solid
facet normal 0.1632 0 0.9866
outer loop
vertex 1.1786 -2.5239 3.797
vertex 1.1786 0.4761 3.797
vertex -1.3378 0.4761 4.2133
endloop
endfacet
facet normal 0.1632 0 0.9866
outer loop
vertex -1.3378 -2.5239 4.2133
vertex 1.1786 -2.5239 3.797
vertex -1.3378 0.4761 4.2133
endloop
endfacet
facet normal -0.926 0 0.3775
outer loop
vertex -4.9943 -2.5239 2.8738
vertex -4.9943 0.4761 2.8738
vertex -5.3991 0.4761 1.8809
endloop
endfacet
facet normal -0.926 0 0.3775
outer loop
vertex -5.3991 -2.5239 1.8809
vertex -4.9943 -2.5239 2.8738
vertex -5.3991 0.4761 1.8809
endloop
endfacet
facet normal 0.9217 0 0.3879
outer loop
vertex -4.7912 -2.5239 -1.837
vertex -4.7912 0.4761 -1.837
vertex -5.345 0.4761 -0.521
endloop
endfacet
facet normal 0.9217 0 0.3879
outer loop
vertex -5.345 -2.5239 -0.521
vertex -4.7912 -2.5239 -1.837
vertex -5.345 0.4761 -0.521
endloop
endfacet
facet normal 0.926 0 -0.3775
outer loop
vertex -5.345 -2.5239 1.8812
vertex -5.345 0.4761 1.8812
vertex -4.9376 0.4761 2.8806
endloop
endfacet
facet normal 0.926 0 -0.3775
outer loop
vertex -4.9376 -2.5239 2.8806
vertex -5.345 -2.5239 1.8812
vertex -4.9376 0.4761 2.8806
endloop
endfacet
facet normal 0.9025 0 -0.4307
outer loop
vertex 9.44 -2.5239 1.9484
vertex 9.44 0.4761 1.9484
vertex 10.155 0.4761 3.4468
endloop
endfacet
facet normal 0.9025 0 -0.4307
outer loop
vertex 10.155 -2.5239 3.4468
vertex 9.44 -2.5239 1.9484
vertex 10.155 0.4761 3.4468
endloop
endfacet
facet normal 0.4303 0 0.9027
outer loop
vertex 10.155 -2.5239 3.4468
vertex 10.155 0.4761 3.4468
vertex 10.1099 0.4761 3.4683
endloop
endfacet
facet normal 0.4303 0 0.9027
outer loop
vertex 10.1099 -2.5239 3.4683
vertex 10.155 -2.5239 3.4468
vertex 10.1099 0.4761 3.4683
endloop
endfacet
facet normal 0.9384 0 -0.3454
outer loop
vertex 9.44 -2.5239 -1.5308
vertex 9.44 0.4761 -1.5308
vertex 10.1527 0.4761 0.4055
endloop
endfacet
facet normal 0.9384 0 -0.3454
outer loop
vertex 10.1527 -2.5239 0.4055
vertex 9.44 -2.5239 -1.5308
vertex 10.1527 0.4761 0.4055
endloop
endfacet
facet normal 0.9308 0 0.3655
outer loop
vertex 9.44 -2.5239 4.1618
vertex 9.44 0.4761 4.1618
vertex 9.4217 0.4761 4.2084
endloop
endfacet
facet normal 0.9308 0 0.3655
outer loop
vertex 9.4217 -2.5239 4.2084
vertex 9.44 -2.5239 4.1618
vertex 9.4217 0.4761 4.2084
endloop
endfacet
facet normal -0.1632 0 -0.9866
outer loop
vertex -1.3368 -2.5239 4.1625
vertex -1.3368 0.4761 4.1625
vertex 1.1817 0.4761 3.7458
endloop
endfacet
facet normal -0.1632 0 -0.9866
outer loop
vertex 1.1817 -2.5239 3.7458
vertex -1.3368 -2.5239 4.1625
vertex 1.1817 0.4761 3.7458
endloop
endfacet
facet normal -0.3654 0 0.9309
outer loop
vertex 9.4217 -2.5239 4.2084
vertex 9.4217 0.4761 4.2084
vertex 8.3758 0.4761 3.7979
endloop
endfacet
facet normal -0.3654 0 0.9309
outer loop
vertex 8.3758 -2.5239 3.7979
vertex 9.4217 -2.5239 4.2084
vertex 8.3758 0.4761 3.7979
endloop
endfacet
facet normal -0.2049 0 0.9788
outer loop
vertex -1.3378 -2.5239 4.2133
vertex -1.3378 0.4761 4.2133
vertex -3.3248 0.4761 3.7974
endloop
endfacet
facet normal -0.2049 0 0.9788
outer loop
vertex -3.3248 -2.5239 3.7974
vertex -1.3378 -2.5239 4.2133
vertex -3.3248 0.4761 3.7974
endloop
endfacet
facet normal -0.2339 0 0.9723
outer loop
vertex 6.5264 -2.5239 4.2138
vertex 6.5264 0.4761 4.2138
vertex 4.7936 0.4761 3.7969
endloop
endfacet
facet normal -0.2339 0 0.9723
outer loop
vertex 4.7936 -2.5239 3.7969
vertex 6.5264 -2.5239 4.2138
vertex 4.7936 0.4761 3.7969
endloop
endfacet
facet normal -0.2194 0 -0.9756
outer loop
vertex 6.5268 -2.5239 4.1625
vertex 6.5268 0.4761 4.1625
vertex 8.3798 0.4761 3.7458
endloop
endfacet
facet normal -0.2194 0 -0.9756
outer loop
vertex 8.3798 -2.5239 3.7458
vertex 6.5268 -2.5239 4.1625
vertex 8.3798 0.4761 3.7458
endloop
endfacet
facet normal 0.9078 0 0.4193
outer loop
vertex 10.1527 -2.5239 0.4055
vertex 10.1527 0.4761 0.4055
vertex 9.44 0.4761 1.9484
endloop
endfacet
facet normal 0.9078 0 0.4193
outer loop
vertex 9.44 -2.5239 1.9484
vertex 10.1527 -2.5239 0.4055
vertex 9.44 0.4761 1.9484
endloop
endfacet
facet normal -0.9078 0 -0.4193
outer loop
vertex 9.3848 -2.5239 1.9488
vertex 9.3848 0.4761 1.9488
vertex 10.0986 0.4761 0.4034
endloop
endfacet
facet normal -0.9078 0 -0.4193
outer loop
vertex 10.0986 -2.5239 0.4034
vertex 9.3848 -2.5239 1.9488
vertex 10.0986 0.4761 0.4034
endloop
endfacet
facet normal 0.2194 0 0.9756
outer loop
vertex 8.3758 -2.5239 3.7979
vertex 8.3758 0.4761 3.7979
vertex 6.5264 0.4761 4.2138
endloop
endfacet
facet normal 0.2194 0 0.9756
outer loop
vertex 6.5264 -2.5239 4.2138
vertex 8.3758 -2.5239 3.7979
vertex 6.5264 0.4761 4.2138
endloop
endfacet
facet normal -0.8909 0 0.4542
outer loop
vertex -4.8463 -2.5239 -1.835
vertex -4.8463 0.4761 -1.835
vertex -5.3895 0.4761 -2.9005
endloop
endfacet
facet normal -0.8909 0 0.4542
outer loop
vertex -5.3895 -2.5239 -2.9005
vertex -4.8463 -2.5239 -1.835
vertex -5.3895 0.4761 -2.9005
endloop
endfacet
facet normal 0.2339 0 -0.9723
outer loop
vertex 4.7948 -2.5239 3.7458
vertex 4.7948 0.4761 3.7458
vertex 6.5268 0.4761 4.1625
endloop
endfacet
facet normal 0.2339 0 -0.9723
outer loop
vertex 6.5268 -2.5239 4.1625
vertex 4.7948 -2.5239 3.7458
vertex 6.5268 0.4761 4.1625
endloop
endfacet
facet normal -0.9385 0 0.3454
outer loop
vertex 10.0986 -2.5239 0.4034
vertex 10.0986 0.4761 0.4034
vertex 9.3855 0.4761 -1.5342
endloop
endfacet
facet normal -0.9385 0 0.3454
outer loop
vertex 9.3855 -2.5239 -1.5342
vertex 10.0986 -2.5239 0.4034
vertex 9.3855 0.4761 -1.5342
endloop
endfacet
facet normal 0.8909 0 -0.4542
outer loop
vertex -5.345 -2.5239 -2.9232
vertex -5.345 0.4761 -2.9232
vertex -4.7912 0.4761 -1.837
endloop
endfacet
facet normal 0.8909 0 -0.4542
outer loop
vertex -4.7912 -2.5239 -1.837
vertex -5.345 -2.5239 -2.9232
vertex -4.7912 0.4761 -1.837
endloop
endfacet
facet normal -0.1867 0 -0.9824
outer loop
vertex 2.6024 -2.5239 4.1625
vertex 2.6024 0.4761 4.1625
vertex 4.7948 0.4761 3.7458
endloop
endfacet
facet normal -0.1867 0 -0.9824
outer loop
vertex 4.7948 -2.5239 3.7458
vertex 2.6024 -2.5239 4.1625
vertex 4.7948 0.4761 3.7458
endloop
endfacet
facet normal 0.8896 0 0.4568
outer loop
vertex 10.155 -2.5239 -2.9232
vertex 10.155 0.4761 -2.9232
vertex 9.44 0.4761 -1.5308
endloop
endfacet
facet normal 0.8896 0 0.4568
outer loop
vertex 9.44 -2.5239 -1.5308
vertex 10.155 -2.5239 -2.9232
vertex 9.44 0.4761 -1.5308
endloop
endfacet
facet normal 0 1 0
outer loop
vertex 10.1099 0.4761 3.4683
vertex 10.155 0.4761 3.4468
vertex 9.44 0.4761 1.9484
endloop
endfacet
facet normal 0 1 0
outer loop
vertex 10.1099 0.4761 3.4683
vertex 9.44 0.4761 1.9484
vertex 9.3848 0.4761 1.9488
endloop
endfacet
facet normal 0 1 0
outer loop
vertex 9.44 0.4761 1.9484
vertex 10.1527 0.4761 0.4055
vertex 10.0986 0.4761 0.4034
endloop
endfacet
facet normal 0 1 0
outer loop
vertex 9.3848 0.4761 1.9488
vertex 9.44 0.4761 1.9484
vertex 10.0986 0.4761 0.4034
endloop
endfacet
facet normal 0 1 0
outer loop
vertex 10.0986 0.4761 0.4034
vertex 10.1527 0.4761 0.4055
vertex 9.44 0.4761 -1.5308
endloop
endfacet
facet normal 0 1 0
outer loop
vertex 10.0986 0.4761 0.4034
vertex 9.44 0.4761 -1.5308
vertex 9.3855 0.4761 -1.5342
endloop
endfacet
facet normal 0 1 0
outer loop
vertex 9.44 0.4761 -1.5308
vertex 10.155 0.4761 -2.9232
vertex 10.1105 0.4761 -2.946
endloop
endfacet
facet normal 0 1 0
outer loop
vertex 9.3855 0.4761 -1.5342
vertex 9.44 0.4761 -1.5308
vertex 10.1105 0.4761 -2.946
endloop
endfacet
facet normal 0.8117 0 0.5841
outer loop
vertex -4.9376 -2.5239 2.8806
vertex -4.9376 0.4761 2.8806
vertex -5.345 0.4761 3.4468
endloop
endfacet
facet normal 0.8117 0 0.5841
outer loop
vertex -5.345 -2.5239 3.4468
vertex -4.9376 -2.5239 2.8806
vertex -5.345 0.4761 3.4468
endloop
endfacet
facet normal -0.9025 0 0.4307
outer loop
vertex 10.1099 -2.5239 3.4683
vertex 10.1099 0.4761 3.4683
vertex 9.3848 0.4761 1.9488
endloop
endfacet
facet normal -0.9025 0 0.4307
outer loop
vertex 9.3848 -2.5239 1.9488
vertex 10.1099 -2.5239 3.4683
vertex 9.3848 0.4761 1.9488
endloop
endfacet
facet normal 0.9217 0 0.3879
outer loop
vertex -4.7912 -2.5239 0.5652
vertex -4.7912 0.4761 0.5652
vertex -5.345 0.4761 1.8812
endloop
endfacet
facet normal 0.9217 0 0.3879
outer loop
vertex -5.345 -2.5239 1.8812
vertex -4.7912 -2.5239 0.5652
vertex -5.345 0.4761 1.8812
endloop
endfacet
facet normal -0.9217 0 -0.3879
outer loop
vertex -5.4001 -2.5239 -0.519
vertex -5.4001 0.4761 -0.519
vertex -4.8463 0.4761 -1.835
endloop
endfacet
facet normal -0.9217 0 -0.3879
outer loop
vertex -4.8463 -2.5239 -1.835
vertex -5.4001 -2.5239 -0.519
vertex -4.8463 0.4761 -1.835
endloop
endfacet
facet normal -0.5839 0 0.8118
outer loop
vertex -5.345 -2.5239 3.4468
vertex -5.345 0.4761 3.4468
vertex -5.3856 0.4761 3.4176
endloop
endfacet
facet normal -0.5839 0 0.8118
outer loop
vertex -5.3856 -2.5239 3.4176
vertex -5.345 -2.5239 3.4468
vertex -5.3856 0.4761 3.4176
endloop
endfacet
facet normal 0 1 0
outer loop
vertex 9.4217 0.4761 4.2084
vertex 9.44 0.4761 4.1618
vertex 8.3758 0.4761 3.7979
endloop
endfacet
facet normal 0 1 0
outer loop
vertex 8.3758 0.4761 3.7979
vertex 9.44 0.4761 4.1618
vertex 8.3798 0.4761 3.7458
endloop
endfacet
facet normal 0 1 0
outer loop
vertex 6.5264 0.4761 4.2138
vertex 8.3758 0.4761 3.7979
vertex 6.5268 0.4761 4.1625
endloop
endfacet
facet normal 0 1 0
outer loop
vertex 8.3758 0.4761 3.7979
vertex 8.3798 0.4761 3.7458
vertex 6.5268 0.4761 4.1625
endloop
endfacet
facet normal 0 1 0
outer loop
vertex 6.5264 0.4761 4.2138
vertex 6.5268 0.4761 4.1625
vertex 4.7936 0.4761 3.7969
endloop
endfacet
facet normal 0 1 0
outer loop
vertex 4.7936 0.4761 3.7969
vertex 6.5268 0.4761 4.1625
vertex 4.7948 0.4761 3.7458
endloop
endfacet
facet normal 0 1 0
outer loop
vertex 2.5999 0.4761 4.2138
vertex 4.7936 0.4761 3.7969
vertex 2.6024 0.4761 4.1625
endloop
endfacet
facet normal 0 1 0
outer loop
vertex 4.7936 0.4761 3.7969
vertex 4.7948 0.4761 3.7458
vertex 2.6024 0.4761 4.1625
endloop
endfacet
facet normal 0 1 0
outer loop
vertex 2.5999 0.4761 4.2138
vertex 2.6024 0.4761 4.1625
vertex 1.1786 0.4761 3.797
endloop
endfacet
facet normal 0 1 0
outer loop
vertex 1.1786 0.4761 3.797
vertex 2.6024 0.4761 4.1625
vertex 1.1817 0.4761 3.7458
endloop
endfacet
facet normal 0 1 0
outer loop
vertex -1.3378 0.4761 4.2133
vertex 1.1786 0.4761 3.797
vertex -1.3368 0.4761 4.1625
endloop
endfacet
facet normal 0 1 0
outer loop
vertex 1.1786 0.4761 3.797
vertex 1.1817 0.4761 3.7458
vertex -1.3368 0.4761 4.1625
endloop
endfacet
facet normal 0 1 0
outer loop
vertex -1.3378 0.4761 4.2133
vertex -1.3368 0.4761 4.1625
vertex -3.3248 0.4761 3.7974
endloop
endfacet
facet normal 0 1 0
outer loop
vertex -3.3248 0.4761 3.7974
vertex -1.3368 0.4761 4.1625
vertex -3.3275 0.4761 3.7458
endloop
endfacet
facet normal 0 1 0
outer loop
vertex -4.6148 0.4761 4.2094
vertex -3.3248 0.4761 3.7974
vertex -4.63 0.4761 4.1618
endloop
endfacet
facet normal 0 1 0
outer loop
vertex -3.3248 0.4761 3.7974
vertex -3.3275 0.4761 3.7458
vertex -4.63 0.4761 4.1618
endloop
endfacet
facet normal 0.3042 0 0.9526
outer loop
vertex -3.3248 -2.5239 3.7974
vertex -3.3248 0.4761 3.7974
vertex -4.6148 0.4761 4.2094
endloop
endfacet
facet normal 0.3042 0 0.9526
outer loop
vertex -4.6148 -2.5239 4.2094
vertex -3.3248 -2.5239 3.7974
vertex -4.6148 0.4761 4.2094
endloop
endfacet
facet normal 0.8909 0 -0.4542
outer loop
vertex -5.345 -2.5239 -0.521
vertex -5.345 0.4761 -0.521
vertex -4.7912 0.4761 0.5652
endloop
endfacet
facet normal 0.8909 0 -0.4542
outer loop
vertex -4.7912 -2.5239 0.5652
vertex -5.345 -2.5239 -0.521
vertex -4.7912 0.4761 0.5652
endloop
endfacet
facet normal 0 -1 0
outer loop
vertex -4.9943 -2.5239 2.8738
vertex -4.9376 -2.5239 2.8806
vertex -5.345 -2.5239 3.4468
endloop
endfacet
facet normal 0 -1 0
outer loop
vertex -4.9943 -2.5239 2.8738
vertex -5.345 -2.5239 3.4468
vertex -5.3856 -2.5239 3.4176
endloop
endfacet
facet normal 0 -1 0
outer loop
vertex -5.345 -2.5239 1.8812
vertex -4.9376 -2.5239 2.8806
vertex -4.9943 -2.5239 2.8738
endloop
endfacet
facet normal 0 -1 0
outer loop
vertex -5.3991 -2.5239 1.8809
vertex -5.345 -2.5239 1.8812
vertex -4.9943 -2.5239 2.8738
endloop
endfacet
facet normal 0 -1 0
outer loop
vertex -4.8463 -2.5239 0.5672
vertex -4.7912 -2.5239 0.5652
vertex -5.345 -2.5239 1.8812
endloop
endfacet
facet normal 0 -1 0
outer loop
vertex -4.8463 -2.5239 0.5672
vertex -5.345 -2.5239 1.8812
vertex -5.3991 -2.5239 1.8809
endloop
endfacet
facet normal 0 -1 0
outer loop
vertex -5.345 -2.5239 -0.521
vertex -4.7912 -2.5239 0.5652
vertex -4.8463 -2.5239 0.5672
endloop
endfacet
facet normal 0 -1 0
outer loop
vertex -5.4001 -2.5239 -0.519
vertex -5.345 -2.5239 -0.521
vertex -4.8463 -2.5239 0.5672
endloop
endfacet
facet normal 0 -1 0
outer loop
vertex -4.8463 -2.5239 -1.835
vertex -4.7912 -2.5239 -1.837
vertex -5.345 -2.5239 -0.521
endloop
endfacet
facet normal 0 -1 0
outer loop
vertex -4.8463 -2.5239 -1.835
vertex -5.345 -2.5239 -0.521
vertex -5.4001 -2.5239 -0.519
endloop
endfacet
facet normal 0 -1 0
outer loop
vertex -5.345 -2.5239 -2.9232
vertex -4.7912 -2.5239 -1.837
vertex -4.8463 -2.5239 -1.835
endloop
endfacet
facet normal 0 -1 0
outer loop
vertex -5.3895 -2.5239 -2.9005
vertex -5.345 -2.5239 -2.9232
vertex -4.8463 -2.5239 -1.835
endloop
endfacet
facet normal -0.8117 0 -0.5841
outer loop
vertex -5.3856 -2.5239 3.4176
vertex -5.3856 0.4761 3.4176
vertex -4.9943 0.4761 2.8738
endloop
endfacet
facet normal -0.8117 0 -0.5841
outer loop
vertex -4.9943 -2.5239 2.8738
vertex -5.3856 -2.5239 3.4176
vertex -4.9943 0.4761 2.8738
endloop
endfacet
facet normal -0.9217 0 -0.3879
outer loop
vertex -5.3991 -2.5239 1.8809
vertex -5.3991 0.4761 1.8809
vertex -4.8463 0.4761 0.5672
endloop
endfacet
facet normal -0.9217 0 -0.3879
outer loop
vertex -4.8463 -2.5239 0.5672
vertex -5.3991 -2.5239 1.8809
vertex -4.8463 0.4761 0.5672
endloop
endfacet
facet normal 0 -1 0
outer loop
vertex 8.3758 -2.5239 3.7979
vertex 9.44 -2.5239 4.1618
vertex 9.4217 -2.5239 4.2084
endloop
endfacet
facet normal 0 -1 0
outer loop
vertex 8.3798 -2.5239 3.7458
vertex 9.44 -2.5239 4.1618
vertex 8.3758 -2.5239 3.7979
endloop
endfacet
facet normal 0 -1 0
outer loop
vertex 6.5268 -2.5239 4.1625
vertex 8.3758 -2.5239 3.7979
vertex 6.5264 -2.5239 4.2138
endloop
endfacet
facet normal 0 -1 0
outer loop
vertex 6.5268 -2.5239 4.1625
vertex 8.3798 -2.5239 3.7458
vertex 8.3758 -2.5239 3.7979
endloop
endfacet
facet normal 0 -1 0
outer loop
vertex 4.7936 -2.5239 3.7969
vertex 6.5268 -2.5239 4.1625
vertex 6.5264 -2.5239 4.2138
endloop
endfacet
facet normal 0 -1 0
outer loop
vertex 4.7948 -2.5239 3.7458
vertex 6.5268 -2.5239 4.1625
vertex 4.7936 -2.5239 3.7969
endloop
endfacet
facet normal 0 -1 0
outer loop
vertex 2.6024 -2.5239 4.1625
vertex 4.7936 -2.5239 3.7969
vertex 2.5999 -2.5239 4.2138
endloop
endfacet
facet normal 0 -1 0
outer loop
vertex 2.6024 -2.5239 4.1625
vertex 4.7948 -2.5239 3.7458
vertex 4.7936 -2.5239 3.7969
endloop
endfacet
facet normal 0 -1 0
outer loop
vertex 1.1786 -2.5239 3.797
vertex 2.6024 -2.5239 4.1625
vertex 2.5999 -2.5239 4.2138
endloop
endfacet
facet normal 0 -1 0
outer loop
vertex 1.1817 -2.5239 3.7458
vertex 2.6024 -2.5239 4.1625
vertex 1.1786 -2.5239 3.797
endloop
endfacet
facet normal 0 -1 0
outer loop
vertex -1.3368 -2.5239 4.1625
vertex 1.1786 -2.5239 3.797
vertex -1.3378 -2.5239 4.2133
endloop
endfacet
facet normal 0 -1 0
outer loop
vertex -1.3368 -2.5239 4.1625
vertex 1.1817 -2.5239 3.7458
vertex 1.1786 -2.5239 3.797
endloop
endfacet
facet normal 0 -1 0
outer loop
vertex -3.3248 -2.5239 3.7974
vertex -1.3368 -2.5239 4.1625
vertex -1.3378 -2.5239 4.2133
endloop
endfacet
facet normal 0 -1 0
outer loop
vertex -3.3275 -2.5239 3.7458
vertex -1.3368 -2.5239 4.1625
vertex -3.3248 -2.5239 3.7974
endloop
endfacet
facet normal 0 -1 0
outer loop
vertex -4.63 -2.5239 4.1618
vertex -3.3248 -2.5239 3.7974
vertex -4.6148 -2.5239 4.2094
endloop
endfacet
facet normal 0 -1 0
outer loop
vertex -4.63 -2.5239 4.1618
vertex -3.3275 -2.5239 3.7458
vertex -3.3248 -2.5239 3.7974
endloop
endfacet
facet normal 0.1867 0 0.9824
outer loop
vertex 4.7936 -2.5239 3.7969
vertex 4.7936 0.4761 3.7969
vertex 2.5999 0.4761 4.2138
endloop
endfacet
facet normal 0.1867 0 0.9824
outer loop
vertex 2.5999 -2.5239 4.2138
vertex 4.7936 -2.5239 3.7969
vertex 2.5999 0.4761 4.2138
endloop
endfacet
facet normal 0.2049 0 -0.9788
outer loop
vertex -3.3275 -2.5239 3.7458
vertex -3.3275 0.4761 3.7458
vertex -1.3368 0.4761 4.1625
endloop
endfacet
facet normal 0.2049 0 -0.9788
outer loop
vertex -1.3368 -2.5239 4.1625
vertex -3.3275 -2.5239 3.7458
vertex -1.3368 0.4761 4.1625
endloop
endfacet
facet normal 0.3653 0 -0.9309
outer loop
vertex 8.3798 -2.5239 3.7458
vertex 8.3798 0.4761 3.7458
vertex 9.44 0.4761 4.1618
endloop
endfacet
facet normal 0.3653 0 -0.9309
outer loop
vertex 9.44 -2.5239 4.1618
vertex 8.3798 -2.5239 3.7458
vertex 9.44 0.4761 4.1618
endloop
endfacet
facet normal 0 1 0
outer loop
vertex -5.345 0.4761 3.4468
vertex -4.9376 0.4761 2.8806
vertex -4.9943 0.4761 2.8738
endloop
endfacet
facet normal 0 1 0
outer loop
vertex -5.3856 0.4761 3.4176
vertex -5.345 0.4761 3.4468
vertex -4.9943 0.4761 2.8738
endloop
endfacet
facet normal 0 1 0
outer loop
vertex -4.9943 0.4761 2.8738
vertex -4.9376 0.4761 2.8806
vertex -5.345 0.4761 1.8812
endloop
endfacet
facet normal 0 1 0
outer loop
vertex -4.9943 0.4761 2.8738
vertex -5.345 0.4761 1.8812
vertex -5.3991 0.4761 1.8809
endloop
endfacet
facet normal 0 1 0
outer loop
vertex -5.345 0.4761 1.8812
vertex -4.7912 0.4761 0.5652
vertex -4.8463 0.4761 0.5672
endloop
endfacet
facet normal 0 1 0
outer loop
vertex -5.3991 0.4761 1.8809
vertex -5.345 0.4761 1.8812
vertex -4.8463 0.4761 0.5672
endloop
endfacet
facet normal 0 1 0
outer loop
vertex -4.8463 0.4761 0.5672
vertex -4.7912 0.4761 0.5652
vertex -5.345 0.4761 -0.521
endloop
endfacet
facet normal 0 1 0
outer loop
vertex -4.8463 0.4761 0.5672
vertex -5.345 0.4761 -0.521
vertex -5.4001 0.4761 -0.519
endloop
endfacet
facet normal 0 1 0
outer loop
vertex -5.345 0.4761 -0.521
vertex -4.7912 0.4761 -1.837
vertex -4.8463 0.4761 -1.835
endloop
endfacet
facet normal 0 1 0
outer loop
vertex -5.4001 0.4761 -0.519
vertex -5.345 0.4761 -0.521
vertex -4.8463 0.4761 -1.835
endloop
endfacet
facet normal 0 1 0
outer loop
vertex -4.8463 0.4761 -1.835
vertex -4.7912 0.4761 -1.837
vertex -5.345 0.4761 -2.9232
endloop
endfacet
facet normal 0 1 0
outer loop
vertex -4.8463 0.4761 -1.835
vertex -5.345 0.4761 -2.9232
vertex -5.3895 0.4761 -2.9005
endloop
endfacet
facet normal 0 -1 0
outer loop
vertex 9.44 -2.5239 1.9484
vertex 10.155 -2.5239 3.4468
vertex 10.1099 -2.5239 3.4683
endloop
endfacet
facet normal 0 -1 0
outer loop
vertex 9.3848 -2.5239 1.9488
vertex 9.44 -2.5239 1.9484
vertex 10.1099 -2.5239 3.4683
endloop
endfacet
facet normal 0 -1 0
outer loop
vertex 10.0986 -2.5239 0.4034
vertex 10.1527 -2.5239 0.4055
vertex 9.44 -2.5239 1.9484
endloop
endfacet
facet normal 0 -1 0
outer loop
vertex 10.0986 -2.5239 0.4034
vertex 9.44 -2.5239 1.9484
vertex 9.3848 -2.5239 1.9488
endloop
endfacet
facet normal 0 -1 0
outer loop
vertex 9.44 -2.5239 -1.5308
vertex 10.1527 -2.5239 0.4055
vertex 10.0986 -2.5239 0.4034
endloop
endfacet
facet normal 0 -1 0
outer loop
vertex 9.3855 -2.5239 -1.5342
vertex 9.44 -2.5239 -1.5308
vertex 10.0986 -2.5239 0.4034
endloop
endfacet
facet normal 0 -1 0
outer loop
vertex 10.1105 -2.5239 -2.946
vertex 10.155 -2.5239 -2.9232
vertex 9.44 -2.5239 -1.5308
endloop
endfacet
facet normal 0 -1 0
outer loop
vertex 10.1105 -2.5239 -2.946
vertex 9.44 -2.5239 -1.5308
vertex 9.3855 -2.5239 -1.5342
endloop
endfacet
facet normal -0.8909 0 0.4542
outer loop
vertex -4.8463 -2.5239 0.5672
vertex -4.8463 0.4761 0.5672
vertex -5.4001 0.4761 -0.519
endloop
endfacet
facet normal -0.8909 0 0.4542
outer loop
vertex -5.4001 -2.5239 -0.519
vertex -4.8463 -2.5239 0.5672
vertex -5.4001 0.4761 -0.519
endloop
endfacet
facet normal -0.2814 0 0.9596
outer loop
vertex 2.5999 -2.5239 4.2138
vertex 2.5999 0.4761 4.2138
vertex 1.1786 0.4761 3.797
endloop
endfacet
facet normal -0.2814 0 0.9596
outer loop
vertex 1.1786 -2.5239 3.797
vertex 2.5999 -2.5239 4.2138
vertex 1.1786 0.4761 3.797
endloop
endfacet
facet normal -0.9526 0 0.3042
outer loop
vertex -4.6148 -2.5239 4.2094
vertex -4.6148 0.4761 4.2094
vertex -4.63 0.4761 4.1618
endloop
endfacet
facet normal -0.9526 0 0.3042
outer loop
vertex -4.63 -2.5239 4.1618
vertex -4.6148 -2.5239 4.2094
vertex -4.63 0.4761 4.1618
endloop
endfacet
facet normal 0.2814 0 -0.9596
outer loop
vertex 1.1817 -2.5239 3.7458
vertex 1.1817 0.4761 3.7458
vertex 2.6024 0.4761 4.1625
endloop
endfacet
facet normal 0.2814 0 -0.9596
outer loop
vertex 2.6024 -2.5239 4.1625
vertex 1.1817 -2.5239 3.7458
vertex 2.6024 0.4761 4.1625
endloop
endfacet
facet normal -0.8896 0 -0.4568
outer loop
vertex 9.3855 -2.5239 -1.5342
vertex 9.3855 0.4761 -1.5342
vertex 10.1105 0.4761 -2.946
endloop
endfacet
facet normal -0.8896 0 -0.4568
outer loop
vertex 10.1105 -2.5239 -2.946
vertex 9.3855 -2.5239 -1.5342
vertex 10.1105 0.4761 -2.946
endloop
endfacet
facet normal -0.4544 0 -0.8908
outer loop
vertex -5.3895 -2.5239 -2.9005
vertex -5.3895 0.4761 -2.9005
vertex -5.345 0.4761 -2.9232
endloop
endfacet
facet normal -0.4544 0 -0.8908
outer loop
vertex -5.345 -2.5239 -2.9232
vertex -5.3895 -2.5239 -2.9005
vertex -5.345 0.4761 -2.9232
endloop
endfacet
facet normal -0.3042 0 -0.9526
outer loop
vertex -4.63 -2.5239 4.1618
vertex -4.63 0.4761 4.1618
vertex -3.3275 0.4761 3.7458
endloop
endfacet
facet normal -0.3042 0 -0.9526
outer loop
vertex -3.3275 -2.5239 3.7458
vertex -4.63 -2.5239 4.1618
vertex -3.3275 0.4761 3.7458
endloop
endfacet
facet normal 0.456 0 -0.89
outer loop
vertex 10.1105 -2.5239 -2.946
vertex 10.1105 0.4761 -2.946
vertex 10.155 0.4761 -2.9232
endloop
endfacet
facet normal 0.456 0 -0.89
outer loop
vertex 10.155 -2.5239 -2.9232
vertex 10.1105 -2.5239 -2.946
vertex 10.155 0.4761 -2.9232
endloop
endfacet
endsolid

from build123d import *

# Parameters (mm, degrees)
EXTRUDE_THIN10_START   = 0.47614
EXTRUDE_THIN10_DEPTH   = 3
EXTRUDE_THIN10_2_DEPTH = 3
EXTRUDE_THIN10_3_DEPTH = 3


with BuildPart() as part:
    # Sketch1 → Extrude-Thin10 (new body)
    with BuildSketch(Plane(origin=(0, 0, 0), x_dir=(1, 0, 0), z_dir=(0, 1, 0)).offset(EXTRUDE_THIN10_START)):
        Polygon((-5.344998837, 2.923194647), (-4.791238449, 1.836977847), (-5.344998837, 0.520996496), (-4.791238449, -0.565220304), (-5.344998837, -1.881201656), (-4.937600398, -2.880557356), (-5.344998837, -3.446805239), (-5.385585749, -3.417604168), (-4.994344658, -2.873813573), (-5.399117596, -1.880898273), (-4.846333276, -0.567236492), (-5.400093664, 0.518980307), (-4.846333276, 1.834961659), (-5.389544097, 2.900485183), align=None)
    extrude(amount=-EXTRUDE_THIN10_DEPTH)


with BuildPart() as body_2:
    # Sketch1 → Extrude-Thin10 2 (new body)
    with BuildSketch(Plane(origin=(0, 0, 0), x_dir=(1, 0, 0), z_dir=(0, 1, 0)).offset(EXTRUDE_THIN10_START)):
        Polygon((-4.629998684, -4.16180563), (-3.327453045, -3.745803105), (-1.336770496, -4.162457592), (1.181674404, -3.745803105), (2.602406923, -4.162457592), (4.794817652, -3.745803105), (6.526832136, -4.162457592), (8.379823695, -3.745803105), (9.440000534, -4.16180563), (9.421736763, -4.208350604), (8.375833249, -3.797948787), (6.526449725, -4.213791989), (4.793583387, -3.796932579), (2.599901518, -4.213828639), (1.17856535, -3.796997121), (-1.337848026, -4.213315511), (-3.324796084, -3.797442661), (-4.614786837, -4.209435449), align=None)
    extrude(amount=-EXTRUDE_THIN10_2_DEPTH)


with BuildPart() as body_3:
    # Sketch1 → Extrude-Thin10 3 (new body)
    with BuildSketch(Plane(origin=(0, 0, 0), x_dir=(1, 0, 0), z_dir=(0, 1, 0)).offset(EXTRUDE_THIN10_START)):
        Polygon((10.155000687, 2.923194647), (9.440000534, 1.530846994), (10.152701275, -0.405525353), (9.440000534, -1.948419986), (10.155000687, -3.446805239), (10.109875016, -3.468338327), (9.384764432, -1.948765215), (10.098625013, -0.403359694), (9.385498872, 1.534168444), (10.110522476, 2.946035155), align=None)
    extrude(amount=-EXTRUDE_THIN10_3_DEPTH)


solid = Compound([part.part, body_2.part, body_3.part])
